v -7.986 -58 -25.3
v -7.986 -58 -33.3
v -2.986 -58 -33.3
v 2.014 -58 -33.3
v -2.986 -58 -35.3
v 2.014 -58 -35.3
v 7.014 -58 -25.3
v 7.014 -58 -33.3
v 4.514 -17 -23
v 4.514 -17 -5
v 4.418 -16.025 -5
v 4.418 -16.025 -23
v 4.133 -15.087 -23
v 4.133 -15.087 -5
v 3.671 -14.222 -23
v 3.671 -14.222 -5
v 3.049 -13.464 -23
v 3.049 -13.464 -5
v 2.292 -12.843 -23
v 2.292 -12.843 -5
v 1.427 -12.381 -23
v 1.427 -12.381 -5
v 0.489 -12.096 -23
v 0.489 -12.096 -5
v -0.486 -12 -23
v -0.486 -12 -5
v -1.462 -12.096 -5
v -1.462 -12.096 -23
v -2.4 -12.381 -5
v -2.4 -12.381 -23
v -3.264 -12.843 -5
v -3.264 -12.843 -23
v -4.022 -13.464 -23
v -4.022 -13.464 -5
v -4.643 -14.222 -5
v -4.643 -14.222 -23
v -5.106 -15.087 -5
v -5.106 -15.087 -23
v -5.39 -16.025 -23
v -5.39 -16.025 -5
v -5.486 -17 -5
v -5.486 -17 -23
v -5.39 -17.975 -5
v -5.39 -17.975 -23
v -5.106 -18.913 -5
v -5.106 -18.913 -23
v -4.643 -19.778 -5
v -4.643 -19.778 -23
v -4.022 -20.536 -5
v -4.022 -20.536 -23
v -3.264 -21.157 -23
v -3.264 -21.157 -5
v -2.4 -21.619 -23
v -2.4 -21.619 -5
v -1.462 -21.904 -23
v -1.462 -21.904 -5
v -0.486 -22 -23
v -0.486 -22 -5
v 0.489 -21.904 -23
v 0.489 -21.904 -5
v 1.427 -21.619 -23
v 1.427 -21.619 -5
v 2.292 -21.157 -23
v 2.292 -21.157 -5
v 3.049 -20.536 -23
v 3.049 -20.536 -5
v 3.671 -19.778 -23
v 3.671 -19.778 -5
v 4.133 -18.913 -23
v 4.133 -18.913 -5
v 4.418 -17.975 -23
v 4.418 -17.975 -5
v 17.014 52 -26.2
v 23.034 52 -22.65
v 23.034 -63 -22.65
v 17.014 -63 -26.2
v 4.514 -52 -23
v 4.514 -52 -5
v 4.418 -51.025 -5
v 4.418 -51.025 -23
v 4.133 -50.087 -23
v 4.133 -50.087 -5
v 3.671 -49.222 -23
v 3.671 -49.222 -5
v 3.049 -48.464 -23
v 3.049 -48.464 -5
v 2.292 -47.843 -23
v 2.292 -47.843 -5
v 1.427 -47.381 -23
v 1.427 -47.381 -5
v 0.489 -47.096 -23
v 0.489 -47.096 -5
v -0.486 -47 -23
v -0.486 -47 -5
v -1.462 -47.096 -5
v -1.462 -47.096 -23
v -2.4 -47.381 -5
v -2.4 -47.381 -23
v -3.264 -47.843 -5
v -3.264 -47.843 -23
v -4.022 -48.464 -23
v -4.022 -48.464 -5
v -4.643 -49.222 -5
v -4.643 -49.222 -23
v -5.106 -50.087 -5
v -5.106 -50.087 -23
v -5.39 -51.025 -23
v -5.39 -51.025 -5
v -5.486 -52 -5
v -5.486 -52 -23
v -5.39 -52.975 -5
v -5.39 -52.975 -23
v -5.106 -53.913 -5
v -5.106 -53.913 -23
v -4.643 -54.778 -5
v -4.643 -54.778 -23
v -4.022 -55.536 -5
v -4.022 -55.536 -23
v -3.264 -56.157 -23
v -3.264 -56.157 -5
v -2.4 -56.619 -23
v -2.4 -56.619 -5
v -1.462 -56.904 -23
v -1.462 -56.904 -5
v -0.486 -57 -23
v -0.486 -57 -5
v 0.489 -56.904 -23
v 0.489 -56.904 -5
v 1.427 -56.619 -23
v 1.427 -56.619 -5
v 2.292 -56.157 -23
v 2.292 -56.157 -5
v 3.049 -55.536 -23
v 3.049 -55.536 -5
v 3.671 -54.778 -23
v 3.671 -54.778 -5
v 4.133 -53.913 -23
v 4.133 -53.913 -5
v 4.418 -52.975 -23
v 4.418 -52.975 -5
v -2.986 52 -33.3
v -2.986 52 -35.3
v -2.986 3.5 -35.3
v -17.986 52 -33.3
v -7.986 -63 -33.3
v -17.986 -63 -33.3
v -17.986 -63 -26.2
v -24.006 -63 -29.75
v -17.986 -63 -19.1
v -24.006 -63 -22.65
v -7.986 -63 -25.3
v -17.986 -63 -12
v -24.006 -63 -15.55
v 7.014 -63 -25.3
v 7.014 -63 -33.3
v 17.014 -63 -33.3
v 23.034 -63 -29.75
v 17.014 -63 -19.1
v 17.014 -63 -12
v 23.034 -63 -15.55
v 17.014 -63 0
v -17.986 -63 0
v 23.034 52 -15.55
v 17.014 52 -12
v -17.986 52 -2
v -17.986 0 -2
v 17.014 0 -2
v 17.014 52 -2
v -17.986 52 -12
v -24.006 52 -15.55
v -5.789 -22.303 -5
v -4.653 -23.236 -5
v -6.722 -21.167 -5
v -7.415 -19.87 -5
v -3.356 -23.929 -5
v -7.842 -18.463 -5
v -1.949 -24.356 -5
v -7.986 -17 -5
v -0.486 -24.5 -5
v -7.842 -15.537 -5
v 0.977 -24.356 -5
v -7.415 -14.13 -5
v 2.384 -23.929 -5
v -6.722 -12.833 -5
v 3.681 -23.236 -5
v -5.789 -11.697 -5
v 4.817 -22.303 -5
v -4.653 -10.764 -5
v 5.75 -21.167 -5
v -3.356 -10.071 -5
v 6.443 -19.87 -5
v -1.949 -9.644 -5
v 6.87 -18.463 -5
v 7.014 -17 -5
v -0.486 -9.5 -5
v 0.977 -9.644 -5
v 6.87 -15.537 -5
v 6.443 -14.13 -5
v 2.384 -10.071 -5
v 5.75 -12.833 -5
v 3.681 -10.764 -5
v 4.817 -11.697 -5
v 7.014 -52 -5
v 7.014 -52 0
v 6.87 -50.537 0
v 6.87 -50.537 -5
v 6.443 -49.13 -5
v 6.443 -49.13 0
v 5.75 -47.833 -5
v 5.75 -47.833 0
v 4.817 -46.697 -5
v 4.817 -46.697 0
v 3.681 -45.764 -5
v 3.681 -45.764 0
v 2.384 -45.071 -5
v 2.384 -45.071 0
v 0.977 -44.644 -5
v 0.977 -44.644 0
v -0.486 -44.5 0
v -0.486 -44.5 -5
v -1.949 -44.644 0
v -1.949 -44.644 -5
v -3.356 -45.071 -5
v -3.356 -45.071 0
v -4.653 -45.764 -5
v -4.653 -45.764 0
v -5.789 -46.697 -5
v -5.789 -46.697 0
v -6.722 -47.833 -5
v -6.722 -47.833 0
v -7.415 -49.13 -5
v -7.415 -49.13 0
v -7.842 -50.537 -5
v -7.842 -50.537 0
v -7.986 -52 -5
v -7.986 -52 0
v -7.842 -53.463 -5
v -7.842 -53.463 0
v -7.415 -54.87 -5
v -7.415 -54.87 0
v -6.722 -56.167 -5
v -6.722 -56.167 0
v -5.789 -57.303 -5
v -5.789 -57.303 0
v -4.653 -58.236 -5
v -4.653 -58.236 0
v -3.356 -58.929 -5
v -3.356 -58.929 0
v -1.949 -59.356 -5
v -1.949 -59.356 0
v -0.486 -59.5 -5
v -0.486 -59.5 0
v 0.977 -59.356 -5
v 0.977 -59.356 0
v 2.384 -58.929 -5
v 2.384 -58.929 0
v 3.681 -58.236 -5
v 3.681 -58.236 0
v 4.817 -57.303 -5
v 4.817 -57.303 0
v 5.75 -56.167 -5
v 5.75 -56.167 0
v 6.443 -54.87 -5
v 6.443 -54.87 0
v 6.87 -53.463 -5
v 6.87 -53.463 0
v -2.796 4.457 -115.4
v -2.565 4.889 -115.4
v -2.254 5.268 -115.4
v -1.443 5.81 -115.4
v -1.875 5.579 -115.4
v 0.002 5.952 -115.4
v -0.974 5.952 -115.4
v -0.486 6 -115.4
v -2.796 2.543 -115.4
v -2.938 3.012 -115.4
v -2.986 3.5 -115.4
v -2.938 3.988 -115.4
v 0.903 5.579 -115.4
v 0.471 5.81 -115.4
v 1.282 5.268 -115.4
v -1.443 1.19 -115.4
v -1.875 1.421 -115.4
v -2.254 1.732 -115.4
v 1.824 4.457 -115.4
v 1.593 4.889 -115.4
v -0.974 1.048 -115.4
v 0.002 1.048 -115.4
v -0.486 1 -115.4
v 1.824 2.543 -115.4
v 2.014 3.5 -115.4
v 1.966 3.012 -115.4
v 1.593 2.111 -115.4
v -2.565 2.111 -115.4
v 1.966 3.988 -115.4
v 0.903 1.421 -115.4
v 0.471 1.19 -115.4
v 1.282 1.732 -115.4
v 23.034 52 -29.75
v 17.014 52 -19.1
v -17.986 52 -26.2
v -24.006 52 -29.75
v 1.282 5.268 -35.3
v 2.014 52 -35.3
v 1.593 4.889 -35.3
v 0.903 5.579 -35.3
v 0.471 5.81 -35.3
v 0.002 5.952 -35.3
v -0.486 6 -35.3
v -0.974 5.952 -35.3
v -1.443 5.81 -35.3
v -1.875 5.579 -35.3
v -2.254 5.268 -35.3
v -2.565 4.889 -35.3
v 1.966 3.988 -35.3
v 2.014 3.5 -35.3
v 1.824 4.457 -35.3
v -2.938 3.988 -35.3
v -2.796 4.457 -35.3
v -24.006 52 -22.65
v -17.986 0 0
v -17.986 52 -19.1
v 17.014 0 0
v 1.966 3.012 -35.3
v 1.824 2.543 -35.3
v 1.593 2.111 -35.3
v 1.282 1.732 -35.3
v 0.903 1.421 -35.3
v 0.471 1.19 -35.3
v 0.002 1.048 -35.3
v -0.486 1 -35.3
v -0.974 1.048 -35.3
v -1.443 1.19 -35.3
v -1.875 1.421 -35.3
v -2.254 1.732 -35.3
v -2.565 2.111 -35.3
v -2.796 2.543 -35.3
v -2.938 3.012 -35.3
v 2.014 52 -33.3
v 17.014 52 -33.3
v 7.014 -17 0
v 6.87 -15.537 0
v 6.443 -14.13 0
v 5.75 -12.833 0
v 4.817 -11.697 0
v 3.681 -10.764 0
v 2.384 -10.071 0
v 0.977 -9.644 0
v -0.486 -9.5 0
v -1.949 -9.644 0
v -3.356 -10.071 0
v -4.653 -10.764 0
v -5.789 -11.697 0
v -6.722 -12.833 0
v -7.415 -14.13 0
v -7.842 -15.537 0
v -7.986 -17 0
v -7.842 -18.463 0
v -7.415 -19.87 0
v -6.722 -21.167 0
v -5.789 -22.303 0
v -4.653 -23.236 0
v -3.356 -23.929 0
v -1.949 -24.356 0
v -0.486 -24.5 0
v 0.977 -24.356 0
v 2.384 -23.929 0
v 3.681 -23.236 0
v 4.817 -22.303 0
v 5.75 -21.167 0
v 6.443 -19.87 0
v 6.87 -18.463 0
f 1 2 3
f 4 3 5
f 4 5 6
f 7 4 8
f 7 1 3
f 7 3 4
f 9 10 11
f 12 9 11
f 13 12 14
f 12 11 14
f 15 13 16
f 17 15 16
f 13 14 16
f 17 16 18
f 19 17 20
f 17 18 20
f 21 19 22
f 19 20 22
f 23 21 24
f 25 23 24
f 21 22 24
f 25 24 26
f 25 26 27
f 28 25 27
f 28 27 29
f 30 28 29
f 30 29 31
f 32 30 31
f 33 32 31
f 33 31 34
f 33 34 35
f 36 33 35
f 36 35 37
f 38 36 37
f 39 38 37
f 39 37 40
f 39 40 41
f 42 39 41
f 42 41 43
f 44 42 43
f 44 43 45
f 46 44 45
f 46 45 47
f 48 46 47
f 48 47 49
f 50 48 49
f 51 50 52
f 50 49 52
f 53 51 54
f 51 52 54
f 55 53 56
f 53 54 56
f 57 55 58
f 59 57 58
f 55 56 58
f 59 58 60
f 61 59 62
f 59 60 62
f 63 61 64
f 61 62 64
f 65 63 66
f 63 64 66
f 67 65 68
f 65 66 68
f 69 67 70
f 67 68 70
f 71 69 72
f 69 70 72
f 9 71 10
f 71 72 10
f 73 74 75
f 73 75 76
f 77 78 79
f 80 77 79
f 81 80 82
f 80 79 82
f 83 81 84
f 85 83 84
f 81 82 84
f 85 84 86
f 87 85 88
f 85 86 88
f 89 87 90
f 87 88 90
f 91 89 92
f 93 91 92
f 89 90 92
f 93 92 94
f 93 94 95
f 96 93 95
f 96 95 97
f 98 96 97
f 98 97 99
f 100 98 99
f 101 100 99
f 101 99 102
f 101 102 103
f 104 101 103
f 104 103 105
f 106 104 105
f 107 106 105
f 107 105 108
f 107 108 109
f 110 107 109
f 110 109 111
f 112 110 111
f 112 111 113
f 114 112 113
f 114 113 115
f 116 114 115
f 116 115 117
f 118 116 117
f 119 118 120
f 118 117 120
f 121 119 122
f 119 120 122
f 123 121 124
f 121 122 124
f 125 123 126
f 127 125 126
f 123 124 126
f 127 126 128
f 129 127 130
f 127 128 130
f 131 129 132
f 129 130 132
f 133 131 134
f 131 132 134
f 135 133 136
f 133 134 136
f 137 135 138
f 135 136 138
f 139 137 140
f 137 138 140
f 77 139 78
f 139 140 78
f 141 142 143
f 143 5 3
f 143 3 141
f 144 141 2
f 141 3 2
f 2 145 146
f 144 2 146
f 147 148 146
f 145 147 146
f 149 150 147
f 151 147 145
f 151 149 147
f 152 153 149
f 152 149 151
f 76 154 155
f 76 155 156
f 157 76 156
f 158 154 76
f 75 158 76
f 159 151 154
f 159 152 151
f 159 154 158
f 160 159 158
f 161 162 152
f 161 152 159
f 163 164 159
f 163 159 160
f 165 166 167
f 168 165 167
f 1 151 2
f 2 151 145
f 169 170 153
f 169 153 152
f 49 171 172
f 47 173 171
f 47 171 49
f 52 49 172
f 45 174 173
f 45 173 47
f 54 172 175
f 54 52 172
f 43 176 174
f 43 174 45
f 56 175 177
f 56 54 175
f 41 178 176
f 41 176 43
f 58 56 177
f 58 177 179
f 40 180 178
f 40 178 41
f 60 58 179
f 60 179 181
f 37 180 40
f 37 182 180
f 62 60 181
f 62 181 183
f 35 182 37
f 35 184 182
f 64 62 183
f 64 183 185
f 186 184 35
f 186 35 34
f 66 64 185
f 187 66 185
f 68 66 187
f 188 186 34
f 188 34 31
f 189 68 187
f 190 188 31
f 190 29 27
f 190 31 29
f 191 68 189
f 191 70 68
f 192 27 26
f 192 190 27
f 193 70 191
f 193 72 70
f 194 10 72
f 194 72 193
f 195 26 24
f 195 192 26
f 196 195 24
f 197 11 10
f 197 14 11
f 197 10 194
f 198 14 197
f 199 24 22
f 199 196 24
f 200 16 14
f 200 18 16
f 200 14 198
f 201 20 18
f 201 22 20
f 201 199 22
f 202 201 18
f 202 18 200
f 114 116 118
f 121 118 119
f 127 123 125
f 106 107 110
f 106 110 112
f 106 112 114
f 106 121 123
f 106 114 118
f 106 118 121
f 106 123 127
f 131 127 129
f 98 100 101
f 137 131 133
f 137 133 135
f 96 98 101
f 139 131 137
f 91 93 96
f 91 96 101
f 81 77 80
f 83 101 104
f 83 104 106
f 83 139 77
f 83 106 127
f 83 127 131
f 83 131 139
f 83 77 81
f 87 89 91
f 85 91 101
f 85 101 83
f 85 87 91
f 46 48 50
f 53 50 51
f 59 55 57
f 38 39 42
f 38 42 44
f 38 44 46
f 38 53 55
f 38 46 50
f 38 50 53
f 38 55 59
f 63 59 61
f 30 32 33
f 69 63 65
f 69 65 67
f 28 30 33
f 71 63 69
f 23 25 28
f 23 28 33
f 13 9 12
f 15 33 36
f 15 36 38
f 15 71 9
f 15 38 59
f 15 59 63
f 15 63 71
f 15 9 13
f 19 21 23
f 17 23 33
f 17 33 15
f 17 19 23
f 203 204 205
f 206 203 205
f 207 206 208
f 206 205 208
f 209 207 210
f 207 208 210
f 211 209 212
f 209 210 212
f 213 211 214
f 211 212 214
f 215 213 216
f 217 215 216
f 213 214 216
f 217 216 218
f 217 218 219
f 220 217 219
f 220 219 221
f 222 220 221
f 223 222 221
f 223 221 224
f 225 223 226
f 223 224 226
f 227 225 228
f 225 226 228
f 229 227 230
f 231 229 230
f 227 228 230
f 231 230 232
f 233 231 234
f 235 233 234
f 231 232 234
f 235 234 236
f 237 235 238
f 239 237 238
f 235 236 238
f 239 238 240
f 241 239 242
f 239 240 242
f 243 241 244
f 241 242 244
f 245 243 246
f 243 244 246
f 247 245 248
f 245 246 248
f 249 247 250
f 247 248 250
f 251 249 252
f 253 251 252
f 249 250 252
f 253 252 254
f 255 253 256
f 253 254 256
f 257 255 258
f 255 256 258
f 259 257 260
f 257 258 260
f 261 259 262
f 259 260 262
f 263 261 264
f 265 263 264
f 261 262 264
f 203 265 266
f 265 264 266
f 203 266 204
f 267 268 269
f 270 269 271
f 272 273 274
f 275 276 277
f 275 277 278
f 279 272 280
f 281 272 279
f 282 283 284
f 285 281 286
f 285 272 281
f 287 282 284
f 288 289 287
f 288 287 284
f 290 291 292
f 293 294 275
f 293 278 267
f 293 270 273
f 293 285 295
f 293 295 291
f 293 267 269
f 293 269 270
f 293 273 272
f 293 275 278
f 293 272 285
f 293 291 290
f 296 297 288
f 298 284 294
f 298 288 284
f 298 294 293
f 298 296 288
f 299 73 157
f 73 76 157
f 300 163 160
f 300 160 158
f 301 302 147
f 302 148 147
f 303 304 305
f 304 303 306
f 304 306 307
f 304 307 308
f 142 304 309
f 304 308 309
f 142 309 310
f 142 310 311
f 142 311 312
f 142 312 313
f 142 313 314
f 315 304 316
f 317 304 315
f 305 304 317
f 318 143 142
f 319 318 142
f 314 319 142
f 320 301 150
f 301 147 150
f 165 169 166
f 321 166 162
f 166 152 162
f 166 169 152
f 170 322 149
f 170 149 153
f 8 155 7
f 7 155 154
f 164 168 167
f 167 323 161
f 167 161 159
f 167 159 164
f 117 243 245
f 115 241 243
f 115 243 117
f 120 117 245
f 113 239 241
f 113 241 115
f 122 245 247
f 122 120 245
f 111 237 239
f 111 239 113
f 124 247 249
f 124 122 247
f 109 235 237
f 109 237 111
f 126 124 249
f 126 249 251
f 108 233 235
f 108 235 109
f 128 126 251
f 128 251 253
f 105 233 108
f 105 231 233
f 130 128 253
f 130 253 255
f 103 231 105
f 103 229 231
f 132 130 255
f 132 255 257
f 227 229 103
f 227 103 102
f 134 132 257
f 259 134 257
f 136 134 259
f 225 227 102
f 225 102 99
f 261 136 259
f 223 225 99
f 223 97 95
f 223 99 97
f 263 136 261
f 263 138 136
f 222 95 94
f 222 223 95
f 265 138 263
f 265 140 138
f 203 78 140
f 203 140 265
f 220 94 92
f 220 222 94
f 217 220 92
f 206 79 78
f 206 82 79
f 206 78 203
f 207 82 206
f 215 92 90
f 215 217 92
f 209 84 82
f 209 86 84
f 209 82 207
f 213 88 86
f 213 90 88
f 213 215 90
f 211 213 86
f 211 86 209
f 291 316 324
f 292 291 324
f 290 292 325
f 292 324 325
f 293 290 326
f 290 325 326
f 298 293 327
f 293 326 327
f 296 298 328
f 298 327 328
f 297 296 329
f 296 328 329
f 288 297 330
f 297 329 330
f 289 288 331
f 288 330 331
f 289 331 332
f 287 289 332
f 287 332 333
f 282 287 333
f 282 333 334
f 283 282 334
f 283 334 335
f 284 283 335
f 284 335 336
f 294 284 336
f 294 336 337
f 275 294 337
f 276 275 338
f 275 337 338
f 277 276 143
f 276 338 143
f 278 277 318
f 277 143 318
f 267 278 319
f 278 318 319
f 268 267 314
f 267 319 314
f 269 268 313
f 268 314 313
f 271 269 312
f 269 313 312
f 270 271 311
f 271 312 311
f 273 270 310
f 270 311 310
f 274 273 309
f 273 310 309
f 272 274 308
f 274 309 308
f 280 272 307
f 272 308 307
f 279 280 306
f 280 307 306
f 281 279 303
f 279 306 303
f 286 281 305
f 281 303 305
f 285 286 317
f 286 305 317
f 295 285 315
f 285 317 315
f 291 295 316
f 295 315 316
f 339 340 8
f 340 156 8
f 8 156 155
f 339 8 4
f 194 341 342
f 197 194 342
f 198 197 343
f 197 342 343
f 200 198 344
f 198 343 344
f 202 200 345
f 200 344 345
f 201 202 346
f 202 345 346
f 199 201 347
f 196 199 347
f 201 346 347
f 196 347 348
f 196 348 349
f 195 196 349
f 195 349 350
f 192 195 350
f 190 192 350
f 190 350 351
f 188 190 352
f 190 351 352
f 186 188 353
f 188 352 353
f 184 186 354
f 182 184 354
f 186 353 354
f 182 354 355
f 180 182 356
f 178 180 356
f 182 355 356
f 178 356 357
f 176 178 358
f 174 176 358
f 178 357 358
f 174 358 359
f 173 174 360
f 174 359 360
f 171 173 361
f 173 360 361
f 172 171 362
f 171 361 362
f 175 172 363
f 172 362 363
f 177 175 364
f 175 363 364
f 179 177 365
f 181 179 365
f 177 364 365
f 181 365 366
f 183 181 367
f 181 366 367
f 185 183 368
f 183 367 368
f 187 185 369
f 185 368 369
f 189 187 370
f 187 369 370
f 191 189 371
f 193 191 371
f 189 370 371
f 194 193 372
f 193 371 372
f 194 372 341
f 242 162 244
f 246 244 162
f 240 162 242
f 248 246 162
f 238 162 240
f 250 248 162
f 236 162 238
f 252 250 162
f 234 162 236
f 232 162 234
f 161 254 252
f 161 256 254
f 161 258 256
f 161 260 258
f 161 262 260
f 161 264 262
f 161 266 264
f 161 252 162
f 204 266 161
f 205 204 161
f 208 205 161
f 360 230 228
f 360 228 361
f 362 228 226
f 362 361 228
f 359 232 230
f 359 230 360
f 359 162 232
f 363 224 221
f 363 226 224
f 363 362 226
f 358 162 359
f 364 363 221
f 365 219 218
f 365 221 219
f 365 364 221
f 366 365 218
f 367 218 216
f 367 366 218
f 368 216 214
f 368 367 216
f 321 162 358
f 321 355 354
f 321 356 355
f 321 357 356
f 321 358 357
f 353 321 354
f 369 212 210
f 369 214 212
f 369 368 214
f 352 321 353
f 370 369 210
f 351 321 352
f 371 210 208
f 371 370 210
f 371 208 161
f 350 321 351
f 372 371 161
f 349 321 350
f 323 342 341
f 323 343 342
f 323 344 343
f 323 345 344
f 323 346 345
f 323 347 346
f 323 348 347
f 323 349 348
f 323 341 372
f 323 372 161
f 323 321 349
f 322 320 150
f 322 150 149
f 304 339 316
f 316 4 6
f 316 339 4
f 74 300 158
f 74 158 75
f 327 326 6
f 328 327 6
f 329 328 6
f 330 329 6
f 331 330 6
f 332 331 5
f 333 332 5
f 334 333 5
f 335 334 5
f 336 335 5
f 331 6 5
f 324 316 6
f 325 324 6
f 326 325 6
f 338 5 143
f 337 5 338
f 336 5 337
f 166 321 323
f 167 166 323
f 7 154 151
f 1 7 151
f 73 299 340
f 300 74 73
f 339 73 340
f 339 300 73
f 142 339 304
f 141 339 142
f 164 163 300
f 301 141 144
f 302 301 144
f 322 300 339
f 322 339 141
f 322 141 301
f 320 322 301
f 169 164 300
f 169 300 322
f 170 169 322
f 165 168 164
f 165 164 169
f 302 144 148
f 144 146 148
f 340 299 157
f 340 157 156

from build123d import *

# Parameters (mm, degrees)
F0_W      = 35
F0_H      = 63
F1_DEPTH  = 35.3
F2_W      = 15
F2_H      = 2
F3_DEPTH  = 63.001
F4_DEPTH  = 63
F5_R      = 5
F6_DEPTH  = 23
F5_R_2    = 7.5
F7_DEPTH  = 5
F9_DEPTH  = 5
F11_DEPTH = 52
F12_R     = 2.5
F13_DEPTH = 80.1


with BuildPart() as f1:
    # F0 (on Top) → F1 (new body)
    with BuildSketch(Plane.XY):
        with Locations((-0.486111, -31.5)):
            Rectangle(F0_W, F0_H)
    extrude(amount=-F1_DEPTH)

    # F2 (on face) → F3 (cut, through all)
    with BuildSketch(Plane.XZ.offset(63)):
        with Locations((9.513889, -34.3)):
            Rectangle(F2_W, F2_H)
        with Locations((-10.486111, -34.3)):
            Rectangle(F2_W, F2_H)
    extrude(amount=-F3_DEPTH, mode=Mode.SUBTRACT)

    # F2 (on face) → F4 (join)
    with BuildSketch(Plane.XZ.offset(63)):
        Polygon((-17.986111, -19.1), (-17.986111, -12), (-24.006156, -15.55), align=None)
        Polygon((-17.986111, -26.2), (-17.986111, -19.1), (-24.006156, -22.65), align=None)
        Polygon((-17.986111, -33.3), (-17.986111, -26.2), (-24.006156, -29.75), align=None)
        Polygon((23.033934, -29.75), (17.013889, -26.2), (17.013889, -33.3), align=None)
        Polygon((23.033934, -15.55), (17.013889, -12), (17.013889, -19.1), align=None)
        Polygon((23.033934, -22.65), (17.013889, -19.1), (17.013889, -26.2), align=None)
    extrude(amount=-F4_DEPTH)

    # F5 (on face) → F6 (cut)
    with BuildSketch(Plane.XY):
        with Locations((-0.486111, -17)):
            Circle(F5_R)
        with Locations((-0.486111, -52)):
            Circle(F5_R)
    extrude(amount=-F6_DEPTH, mode=Mode.SUBTRACT)

    # F5 (on face) → F7 (cut)
    with BuildSketch(Plane.XY):
        with Locations((-0.486111, -17)):
            Circle(F5_R_2)
        with Locations((-0.486111, -17)):
            Circle(F5_R, mode=Mode.SUBTRACT)
        with Locations((-0.486111, -52)):
            Circle(F5_R_2)
        with Locations((-0.486111, -52)):
            Circle(F5_R, mode=Mode.SUBTRACT)
    extrude(amount=-F7_DEPTH, mode=Mode.SUBTRACT)

    # F8 (on face) → F9 (cut)
    with BuildSketch(Plane.XZ.offset(63)):
        Polygon((-0.486111, -25.3), (-7.986111, -25.3), (-7.986111, -35.504304), (7.013889, -35.504304), (7.013889, -25.3), align=None)
    extrude(amount=-F9_DEPTH, mode=Mode.SUBTRACT)

    # F10 (on face) → F11 (join)
    with BuildSketch(Plane(origin=(0, 0, 0), x_dir=(-1, 0, 0), z_dir=(0, 1, 0))):
        Polygon((17.986111, -2), (-17.013889, -2), (-17.013889, -12), (-23.033934, -15.55), (-17.013889, -19.1), (-23.033934, -22.65), (-17.013889, -26.2), (-23.033934, -29.75), (-17.013889, -33.3), (-2.013889, -33.3), (-2.013889, -35.3), (2.986111, -35.3), (2.986111, -33.3), (17.986111, -33.3), (24.006156, -29.75), (17.986111, -26.2), (24.006156, -22.65), (17.986111, -19.1), (24.006156, -15.55), (17.986111, -12), align=None)
    extrude(amount=F11_DEPTH)

    # F12 (on face) → F13 (join)
    with BuildSketch(Plane(origin=(0, 0, -35.3), x_dir=(1, 0, 0), z_dir=(0, 0, -1))):
        with Locations((-0.486111, -3.5)):
            Circle(F12_R)
    extrude(amount=F13_DEPTH)


solid = f1.part
